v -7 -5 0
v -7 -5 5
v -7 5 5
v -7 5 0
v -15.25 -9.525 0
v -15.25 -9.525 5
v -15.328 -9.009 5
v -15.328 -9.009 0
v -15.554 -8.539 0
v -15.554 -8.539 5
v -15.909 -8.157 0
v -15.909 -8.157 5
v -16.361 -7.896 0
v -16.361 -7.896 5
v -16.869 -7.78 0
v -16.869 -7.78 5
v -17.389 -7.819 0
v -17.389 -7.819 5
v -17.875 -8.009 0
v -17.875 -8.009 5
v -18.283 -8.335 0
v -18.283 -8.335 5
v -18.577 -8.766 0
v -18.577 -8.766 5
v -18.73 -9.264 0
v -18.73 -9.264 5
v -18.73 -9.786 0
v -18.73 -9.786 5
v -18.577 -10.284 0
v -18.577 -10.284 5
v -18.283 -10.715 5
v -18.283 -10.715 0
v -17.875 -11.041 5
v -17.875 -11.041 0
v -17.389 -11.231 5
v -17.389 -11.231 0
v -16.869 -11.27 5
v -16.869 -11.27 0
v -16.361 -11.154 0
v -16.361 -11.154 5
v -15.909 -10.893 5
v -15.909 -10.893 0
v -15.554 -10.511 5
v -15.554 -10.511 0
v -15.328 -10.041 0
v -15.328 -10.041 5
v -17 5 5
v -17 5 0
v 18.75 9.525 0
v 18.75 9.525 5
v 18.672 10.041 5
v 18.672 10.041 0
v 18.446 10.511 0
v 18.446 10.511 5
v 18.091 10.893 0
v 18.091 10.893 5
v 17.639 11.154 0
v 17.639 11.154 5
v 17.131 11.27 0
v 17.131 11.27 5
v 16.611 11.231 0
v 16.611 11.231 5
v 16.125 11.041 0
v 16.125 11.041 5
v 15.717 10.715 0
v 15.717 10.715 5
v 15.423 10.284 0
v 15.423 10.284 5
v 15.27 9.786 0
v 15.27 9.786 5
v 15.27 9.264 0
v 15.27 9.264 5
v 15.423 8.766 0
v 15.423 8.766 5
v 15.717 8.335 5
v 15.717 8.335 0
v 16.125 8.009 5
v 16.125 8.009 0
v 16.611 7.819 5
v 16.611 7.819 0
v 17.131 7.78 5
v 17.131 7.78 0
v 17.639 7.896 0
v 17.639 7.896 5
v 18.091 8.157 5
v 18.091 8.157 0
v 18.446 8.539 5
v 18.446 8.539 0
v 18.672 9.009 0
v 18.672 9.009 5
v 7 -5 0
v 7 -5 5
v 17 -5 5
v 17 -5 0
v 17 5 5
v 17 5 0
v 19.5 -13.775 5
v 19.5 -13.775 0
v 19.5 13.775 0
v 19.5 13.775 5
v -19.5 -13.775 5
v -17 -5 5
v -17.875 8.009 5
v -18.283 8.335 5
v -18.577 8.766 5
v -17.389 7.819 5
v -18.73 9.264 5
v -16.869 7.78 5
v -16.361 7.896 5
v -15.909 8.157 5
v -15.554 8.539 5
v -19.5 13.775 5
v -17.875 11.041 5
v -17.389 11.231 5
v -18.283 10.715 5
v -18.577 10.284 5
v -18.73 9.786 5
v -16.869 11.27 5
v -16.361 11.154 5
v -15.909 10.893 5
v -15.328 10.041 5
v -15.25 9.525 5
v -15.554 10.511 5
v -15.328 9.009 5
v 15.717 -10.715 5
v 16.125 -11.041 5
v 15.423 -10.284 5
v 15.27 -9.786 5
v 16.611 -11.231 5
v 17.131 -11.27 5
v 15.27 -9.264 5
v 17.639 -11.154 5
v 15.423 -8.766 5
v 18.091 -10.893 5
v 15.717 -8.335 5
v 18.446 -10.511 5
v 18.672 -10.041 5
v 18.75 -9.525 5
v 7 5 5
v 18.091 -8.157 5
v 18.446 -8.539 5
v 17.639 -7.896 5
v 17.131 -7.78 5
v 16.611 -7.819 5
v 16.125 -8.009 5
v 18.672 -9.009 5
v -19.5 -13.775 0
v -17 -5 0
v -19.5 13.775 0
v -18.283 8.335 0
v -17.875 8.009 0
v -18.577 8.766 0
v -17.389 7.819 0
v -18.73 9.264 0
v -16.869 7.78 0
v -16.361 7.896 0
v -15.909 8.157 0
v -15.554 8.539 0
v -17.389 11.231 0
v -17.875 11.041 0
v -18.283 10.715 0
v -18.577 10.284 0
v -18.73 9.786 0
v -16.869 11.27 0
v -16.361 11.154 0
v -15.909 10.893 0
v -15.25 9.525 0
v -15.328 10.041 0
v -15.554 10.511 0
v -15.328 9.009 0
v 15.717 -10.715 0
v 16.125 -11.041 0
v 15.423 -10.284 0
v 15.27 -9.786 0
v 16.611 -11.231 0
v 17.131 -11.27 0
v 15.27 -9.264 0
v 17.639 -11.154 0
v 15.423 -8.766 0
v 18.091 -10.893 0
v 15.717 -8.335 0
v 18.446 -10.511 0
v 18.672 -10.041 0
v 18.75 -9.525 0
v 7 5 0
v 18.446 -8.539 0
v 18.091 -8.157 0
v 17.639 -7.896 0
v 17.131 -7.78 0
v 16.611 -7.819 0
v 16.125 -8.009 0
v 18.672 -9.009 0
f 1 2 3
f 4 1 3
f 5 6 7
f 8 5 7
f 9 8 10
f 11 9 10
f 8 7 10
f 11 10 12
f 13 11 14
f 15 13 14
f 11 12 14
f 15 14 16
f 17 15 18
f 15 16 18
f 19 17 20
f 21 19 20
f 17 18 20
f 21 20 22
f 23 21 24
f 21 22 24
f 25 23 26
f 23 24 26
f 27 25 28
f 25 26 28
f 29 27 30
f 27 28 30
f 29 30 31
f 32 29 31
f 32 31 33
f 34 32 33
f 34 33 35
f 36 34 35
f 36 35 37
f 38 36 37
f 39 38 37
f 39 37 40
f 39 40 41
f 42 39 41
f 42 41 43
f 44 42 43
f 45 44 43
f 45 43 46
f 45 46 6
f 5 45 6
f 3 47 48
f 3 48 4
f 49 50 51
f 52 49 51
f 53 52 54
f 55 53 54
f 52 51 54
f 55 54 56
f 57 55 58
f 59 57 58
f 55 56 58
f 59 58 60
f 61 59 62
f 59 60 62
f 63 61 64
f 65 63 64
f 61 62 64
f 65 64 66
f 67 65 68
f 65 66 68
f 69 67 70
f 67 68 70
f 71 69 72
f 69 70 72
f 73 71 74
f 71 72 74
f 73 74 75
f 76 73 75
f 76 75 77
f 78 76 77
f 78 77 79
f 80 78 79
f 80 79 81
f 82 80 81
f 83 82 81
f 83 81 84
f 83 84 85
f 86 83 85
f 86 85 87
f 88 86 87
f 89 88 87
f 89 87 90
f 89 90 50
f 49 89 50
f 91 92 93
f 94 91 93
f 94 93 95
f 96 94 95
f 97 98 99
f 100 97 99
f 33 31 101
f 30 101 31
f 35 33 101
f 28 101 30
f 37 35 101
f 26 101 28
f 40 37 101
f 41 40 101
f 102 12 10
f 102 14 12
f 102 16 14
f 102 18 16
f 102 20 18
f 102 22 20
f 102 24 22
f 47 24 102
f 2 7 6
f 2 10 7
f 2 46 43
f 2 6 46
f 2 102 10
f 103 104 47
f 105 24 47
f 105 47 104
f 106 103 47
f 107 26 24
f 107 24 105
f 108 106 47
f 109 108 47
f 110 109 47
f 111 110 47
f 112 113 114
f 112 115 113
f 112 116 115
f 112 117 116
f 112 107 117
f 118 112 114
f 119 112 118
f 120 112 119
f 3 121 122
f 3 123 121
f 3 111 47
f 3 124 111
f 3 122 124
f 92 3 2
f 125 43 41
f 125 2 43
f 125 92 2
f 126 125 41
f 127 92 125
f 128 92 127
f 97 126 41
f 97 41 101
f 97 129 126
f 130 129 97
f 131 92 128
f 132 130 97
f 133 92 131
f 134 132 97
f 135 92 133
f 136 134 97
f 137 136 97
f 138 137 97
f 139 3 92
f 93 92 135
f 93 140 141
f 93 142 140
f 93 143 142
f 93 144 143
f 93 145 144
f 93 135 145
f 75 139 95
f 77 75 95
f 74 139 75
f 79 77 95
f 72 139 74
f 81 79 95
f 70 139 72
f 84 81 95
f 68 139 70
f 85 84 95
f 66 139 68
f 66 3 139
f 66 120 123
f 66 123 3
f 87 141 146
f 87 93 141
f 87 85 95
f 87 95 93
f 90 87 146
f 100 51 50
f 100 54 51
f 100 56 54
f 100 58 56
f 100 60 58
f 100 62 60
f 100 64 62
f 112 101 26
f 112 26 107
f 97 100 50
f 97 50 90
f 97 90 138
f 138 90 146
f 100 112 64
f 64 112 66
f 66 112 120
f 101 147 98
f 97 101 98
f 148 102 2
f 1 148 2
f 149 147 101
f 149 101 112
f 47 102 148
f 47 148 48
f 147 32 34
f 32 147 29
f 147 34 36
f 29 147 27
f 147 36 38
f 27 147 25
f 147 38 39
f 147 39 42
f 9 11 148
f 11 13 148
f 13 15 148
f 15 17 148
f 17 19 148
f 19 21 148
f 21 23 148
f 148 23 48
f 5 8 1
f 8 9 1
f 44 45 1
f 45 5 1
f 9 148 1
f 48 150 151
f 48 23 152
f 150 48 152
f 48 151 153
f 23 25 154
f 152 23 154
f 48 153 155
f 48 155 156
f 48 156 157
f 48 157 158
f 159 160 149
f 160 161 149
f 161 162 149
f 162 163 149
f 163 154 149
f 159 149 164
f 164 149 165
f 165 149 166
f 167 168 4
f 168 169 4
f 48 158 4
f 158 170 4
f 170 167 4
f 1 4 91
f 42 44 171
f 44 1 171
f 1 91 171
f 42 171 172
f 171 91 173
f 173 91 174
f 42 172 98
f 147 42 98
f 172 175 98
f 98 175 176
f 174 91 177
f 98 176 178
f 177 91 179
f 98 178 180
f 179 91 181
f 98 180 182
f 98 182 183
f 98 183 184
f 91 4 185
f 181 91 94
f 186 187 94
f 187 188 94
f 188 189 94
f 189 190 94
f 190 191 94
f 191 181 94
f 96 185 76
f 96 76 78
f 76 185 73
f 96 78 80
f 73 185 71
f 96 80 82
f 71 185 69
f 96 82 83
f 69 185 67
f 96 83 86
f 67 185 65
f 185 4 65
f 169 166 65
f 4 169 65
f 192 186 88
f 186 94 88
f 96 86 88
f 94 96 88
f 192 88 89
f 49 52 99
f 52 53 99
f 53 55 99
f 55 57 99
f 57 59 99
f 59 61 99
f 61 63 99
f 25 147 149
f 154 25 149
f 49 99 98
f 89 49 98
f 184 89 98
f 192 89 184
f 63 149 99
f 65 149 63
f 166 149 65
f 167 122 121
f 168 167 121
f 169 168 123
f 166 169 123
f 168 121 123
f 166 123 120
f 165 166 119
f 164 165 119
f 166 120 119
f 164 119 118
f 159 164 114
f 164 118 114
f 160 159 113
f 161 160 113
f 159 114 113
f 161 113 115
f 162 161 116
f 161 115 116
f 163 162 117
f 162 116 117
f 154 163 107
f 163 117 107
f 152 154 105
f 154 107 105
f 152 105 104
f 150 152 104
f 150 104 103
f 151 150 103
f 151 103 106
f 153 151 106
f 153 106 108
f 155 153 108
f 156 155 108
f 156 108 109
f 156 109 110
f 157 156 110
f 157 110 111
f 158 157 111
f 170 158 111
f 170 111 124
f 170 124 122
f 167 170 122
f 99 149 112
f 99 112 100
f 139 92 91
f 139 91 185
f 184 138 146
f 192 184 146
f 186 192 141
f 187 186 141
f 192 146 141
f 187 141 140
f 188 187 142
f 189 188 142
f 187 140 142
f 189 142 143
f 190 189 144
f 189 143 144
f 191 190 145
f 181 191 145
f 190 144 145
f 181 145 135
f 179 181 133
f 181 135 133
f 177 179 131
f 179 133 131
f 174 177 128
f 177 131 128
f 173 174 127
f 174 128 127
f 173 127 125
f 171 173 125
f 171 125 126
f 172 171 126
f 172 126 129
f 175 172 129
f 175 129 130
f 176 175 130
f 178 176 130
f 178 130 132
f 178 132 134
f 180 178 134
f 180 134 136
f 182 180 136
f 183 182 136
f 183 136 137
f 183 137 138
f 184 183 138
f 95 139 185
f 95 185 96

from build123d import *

# Parameters (mm, degrees)
F0_W     = 39
F0_H     = 27.55
F1_DEPTH = 5
F2_R     = 1.75
F3_DEPTH = 25
F4_W     = 10
F4_H     = 10
F5_DEPTH = 25


with BuildPart() as f1:
    # F0 (on Top) → F1 (new body)
    with BuildSketch(Plane.XY):
        Rectangle(F0_W, F0_H)
    extrude(amount=F1_DEPTH)

    # F2 (on face) → F3 (cut)
    with BuildSketch(Plane.XY.offset(5)):
        with Locations((-17, 9.525)):
            Circle(F2_R)
        with Locations((-17, -9.525)):
            Circle(F2_R)
        with Locations((17, -9.525)):
            Circle(F2_R)
        with Locations((17, 9.525)):
            Circle(F2_R)
    extrude(amount=-F3_DEPTH, mode=Mode.SUBTRACT)

    # F4 (on face) → F5 (cut)
    with BuildSketch(Plane.XY.offset(5)):
        with Locations((-12, 0)):
            Rectangle(F4_W, F4_H)
        with Locations((12, 0)):
            Rectangle(F4_W, F4_H)
    extrude(amount=-F5_DEPTH, mode=Mode.SUBTRACT)


solid = f1.part
